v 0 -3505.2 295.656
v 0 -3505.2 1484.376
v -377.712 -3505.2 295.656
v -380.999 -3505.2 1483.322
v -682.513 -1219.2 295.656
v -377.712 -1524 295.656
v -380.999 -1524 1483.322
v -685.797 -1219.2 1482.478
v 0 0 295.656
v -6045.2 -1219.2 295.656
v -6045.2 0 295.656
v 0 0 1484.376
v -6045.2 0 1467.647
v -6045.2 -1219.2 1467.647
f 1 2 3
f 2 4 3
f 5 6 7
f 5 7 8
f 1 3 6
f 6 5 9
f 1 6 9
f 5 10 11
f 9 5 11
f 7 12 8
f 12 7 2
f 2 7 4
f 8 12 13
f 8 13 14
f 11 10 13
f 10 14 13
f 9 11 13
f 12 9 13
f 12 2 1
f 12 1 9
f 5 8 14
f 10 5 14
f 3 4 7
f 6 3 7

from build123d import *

# Parameters (mm, degrees)
F0_W     = 3505.2
F0_H     = 1188.72
F2_W     = 3505.2
F2_H     = 1155.192
F5_DEPTH = 1187.6712120329
F7_W     = 3505.2
F7_H     = 1828.8
F8_DEPTH = 6070.6011017


with BuildPart() as f3:
    # F0 (on Right) → F3 section 0
    with BuildSketch(Plane.YZ):
        with Locations((-1752.6, 890.016)):
            Rectangle(F0_W, F0_H)
    # F2 (on offset) → F3 section 1
    with BuildSketch(Plane.YZ.offset(-12115.8)):
        with Locations((-1752.6, 873.252)):
            Rectangle(F2_W, F2_H)
    loft()

    # F4 (on face) → F5 (cut, through all)
    with BuildSketch(Plane(origin=(-4.1076757135, 0, 1484.3646328471), x_dir=(0.9999961711, 0, 0.002767285), z_dir=(-0.002767285, 0, 0.9999961711))):
        Polygon((-11730.7386994129, -1524), (-11730.7386994129, -3505.2), (-376.8923085584, -3505.2), (-376.8923085584, -1524), (-681.6923085584, -1219.2), (-11425.9386994129, -1219.2), align=None)
    extrude(amount=-F5_DEPTH, mode=Mode.SUBTRACT)

    # F7 (on offset) → F8 (cut, through all)
    with BuildSketch(Plane.YZ.offset(-6045.1998984)):
        with Locations((-1752.6, 914.4)):
            Rectangle(F7_W, F7_H)
    extrude(amount=-F8_DEPTH, mode=Mode.SUBTRACT)


solid = f3.part
